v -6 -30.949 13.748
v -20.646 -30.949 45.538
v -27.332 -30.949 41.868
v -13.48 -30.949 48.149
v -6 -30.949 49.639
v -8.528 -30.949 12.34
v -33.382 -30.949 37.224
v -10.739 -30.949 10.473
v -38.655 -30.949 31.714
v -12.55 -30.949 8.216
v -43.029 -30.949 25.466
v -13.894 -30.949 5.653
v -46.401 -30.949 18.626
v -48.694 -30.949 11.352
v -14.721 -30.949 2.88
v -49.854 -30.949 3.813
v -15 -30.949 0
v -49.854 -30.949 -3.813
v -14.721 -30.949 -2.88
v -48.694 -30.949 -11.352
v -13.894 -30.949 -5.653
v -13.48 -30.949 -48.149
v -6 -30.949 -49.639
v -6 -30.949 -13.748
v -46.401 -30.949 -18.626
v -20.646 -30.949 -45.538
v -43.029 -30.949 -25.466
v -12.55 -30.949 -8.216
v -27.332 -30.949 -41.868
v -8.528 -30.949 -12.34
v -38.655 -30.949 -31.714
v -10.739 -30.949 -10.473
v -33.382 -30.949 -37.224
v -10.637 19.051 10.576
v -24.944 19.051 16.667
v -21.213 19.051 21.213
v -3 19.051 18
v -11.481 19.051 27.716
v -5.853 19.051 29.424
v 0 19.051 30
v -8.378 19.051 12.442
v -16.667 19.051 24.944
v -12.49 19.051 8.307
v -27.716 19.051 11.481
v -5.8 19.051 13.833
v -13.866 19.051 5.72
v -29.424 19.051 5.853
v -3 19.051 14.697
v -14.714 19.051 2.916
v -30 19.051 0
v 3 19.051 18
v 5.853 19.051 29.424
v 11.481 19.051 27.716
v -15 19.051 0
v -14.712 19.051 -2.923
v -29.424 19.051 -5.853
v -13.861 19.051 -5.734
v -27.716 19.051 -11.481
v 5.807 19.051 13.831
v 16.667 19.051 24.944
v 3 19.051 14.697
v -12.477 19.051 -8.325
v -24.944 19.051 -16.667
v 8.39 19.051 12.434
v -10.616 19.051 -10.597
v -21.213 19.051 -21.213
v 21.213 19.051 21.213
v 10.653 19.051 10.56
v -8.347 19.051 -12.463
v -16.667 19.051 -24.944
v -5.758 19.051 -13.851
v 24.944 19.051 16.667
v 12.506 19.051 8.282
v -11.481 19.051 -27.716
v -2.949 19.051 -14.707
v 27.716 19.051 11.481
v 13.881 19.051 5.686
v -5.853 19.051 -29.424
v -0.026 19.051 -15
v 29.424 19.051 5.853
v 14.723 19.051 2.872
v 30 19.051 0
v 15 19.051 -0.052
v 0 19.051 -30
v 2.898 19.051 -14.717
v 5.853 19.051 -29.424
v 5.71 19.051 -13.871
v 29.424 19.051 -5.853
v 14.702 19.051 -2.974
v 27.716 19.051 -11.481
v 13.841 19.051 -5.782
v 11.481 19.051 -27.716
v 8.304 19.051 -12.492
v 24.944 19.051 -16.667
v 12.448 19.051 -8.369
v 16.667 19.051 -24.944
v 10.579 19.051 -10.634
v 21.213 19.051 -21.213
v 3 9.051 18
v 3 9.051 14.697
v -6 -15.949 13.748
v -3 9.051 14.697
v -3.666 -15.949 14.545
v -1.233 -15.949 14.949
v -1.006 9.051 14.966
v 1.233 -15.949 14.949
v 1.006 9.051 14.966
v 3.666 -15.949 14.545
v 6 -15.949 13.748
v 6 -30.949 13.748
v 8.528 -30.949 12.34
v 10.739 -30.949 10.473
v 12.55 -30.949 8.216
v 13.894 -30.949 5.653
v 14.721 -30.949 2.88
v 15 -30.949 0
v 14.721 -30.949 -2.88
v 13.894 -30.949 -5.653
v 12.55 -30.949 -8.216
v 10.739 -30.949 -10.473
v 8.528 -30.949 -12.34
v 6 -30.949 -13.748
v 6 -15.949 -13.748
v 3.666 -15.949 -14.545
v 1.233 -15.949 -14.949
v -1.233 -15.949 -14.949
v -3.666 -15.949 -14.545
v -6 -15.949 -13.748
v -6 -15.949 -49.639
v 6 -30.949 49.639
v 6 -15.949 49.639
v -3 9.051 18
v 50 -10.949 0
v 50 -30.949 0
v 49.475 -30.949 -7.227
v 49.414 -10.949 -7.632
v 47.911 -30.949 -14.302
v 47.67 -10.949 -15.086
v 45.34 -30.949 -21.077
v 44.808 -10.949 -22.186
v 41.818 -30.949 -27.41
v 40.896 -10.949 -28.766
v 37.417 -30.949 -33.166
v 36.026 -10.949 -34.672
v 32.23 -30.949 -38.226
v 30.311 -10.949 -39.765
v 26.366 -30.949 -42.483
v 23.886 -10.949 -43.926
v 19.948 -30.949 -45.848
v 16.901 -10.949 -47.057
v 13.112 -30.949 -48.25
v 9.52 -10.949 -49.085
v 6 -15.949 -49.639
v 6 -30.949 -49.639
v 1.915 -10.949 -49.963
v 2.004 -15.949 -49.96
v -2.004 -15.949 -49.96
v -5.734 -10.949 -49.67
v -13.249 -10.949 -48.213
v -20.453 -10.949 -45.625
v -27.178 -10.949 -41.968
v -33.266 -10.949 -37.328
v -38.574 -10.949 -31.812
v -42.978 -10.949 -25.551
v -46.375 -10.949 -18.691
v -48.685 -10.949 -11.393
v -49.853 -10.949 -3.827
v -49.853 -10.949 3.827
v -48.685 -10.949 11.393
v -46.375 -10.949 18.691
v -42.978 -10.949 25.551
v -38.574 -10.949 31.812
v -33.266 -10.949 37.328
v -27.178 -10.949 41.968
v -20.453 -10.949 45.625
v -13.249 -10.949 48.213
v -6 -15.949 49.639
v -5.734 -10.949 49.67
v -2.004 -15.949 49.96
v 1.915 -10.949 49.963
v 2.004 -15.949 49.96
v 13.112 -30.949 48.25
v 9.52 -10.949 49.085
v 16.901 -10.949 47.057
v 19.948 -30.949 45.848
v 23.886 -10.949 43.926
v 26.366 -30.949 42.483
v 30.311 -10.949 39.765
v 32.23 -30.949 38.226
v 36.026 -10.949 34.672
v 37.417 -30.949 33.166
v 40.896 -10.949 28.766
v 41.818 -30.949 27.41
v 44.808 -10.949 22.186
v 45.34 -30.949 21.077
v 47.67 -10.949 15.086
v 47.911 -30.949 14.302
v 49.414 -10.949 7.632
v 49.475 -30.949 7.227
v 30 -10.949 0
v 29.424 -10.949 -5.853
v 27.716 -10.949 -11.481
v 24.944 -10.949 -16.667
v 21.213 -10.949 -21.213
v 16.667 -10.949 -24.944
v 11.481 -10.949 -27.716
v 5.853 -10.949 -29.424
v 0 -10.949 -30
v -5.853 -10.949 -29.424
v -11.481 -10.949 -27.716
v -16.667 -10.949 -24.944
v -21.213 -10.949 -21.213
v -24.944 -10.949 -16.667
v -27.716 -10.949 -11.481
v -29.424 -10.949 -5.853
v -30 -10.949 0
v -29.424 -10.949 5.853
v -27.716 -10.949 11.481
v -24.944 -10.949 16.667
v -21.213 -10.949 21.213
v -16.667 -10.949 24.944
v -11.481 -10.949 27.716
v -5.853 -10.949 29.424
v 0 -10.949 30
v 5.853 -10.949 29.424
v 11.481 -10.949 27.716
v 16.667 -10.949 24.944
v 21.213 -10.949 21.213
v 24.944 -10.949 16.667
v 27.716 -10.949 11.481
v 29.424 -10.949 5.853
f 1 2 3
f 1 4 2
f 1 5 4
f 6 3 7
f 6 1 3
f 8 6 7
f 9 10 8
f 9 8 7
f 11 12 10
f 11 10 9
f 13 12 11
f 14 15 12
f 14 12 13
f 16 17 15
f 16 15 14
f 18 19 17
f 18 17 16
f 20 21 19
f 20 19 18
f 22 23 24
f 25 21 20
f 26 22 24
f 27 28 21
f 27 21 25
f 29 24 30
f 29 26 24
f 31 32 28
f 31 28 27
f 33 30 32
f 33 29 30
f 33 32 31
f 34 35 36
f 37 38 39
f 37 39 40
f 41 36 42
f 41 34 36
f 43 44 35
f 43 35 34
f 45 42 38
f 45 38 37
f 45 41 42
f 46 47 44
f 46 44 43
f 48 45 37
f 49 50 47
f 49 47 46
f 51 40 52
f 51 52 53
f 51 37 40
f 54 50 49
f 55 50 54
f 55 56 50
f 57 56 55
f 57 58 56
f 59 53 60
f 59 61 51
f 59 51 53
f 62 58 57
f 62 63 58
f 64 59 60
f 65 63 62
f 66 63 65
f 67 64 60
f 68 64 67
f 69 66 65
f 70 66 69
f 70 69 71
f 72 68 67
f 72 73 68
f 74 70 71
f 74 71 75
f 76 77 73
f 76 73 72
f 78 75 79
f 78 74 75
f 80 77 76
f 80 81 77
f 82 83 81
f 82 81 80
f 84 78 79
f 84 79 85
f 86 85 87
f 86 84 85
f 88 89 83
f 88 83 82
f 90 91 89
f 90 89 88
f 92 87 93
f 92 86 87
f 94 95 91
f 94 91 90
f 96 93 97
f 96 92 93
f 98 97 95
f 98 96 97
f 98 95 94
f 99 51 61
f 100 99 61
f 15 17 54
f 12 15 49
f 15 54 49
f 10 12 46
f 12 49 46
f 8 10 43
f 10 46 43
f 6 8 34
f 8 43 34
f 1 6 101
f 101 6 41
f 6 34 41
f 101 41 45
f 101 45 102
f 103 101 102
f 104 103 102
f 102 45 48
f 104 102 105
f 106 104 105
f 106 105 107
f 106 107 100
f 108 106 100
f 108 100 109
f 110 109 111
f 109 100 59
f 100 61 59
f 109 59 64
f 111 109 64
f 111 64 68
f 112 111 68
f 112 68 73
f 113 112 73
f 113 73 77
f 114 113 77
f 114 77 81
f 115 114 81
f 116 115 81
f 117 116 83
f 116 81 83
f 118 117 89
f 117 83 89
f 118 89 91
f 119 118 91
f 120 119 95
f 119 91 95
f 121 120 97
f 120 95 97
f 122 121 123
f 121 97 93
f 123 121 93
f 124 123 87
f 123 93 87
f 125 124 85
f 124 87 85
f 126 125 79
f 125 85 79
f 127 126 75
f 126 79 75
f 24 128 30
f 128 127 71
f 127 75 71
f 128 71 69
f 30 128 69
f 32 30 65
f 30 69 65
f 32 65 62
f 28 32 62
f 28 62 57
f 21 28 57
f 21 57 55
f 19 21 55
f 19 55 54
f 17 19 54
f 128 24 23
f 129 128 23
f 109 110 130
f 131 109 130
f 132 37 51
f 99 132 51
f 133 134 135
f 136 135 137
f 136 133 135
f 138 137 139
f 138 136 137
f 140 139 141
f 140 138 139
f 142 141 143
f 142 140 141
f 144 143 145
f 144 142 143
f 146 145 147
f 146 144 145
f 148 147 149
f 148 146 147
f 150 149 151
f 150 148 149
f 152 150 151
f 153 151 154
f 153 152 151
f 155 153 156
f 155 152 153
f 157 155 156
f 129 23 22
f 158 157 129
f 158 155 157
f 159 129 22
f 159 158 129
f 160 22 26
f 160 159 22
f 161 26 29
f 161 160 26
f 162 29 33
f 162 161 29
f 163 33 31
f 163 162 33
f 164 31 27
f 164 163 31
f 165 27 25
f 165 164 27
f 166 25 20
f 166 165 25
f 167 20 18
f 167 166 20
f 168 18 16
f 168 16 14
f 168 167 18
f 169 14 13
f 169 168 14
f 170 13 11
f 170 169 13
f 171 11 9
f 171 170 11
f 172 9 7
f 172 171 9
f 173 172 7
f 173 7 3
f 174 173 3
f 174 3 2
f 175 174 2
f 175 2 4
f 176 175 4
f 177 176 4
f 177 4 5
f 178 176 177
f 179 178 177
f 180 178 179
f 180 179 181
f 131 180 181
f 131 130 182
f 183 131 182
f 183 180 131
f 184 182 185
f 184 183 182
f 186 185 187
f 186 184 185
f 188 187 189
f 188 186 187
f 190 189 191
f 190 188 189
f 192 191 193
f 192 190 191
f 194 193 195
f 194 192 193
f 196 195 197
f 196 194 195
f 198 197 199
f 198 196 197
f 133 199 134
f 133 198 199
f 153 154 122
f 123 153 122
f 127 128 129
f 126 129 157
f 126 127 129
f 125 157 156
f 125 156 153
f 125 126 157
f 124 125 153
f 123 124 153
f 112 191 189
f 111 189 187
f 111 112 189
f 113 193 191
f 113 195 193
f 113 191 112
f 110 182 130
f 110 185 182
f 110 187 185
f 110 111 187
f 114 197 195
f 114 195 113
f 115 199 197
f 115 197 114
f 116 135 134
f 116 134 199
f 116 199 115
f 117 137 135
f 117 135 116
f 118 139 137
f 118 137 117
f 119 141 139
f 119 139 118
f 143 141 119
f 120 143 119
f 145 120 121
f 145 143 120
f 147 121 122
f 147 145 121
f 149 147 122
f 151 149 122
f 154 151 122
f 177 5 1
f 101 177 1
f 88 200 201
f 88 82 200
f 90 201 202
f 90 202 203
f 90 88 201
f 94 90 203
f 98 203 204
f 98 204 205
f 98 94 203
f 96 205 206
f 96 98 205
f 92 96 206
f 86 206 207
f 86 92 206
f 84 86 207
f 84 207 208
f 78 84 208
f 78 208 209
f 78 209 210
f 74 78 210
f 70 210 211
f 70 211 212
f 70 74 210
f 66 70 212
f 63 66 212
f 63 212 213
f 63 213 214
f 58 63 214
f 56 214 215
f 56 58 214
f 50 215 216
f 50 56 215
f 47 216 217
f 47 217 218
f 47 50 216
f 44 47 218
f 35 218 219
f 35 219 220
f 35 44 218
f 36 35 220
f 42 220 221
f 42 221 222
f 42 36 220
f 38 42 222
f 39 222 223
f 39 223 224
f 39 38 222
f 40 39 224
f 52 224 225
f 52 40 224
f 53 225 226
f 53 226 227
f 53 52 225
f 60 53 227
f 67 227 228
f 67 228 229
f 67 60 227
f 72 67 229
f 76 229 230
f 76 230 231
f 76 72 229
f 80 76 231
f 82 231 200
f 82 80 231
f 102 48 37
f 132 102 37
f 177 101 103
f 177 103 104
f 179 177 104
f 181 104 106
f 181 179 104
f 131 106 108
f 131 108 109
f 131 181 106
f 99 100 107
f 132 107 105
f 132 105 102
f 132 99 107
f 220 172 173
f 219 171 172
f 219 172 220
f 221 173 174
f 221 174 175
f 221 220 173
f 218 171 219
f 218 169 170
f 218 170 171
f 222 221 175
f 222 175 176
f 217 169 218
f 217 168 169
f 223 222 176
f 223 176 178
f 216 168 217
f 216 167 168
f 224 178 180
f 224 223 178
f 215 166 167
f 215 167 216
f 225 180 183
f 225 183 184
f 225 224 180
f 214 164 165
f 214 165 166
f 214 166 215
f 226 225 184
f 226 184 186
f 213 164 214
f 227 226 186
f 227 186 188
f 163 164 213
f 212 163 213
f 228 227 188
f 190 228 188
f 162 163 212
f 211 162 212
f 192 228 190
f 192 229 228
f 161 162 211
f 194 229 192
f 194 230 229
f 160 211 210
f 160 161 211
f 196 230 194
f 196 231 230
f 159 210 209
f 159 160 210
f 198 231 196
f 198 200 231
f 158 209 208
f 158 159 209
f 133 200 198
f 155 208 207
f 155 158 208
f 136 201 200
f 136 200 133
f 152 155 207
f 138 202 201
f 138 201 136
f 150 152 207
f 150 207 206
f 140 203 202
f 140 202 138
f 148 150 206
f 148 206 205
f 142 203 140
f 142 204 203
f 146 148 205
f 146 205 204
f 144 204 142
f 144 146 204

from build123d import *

# Parameters (mm, degrees)
F3_DEPTH = 15
F4_R     = 15
F5_DEPTH = 141
F7_DEPTH = 10


with BuildPart() as f1:
    # F0 (on Top) → F1 (revolve)
    with BuildSketch(Plane.XY):
        Polygon((0, 19.0511253548), (0, -30.9488746452), (50, -30.9488746452), (50, -10.9488746452), (30, -10.9488746452), (30, 19.0511253548), align=None)
    revolve(axis=Axis((0, -5.9488746452, 0), (0, 1, 0)))

    # F2 (on face) → F3 (cut)
    with BuildSketch(Plane.XZ.offset(30.9488746452)):
        with BuildLine():
            ThreePointArc((6, 49.638694584), (0, 50), (-6, 49.638694584))
            Line((-6, 49.638694584), (-6, -49.638694584))
            ThreePointArc((-6, -49.638694584), (0, -50), (6, -49.638694584))
            Line((6, -49.638694584), (6, 49.638694584))
        make_face()
    extrude(amount=-F3_DEPTH, mode=Mode.SUBTRACT)

    # F4 (on face) → F5 (cut)
    with BuildSketch(Plane(origin=(0, 19.0511253548, 0), x_dir=(-1, 0, 0), z_dir=(0, 1, 0))):
        Circle(F4_R)
    extrude(amount=-F5_DEPTH, mode=Mode.SUBTRACT)

    # F6 (on face) → F7 (cut)
    with BuildSketch(Plane(origin=(0, 19.0511253548, 0), x_dir=(-1, 0, 0), z_dir=(0, 1, 0))):
        with BuildLine():
            Line((3, 14.6969384567), (3, 18))
            Line((3, 18), (-3, 18))
            Line((-3, 18), (-3, 14.6969384567))
            ThreePointArc((-3, 14.6969384567), (0, 15), (3, 14.6969384567))
        make_face()
    extrude(amount=-F7_DEPTH, mode=Mode.SUBTRACT)


solid = f1.part
